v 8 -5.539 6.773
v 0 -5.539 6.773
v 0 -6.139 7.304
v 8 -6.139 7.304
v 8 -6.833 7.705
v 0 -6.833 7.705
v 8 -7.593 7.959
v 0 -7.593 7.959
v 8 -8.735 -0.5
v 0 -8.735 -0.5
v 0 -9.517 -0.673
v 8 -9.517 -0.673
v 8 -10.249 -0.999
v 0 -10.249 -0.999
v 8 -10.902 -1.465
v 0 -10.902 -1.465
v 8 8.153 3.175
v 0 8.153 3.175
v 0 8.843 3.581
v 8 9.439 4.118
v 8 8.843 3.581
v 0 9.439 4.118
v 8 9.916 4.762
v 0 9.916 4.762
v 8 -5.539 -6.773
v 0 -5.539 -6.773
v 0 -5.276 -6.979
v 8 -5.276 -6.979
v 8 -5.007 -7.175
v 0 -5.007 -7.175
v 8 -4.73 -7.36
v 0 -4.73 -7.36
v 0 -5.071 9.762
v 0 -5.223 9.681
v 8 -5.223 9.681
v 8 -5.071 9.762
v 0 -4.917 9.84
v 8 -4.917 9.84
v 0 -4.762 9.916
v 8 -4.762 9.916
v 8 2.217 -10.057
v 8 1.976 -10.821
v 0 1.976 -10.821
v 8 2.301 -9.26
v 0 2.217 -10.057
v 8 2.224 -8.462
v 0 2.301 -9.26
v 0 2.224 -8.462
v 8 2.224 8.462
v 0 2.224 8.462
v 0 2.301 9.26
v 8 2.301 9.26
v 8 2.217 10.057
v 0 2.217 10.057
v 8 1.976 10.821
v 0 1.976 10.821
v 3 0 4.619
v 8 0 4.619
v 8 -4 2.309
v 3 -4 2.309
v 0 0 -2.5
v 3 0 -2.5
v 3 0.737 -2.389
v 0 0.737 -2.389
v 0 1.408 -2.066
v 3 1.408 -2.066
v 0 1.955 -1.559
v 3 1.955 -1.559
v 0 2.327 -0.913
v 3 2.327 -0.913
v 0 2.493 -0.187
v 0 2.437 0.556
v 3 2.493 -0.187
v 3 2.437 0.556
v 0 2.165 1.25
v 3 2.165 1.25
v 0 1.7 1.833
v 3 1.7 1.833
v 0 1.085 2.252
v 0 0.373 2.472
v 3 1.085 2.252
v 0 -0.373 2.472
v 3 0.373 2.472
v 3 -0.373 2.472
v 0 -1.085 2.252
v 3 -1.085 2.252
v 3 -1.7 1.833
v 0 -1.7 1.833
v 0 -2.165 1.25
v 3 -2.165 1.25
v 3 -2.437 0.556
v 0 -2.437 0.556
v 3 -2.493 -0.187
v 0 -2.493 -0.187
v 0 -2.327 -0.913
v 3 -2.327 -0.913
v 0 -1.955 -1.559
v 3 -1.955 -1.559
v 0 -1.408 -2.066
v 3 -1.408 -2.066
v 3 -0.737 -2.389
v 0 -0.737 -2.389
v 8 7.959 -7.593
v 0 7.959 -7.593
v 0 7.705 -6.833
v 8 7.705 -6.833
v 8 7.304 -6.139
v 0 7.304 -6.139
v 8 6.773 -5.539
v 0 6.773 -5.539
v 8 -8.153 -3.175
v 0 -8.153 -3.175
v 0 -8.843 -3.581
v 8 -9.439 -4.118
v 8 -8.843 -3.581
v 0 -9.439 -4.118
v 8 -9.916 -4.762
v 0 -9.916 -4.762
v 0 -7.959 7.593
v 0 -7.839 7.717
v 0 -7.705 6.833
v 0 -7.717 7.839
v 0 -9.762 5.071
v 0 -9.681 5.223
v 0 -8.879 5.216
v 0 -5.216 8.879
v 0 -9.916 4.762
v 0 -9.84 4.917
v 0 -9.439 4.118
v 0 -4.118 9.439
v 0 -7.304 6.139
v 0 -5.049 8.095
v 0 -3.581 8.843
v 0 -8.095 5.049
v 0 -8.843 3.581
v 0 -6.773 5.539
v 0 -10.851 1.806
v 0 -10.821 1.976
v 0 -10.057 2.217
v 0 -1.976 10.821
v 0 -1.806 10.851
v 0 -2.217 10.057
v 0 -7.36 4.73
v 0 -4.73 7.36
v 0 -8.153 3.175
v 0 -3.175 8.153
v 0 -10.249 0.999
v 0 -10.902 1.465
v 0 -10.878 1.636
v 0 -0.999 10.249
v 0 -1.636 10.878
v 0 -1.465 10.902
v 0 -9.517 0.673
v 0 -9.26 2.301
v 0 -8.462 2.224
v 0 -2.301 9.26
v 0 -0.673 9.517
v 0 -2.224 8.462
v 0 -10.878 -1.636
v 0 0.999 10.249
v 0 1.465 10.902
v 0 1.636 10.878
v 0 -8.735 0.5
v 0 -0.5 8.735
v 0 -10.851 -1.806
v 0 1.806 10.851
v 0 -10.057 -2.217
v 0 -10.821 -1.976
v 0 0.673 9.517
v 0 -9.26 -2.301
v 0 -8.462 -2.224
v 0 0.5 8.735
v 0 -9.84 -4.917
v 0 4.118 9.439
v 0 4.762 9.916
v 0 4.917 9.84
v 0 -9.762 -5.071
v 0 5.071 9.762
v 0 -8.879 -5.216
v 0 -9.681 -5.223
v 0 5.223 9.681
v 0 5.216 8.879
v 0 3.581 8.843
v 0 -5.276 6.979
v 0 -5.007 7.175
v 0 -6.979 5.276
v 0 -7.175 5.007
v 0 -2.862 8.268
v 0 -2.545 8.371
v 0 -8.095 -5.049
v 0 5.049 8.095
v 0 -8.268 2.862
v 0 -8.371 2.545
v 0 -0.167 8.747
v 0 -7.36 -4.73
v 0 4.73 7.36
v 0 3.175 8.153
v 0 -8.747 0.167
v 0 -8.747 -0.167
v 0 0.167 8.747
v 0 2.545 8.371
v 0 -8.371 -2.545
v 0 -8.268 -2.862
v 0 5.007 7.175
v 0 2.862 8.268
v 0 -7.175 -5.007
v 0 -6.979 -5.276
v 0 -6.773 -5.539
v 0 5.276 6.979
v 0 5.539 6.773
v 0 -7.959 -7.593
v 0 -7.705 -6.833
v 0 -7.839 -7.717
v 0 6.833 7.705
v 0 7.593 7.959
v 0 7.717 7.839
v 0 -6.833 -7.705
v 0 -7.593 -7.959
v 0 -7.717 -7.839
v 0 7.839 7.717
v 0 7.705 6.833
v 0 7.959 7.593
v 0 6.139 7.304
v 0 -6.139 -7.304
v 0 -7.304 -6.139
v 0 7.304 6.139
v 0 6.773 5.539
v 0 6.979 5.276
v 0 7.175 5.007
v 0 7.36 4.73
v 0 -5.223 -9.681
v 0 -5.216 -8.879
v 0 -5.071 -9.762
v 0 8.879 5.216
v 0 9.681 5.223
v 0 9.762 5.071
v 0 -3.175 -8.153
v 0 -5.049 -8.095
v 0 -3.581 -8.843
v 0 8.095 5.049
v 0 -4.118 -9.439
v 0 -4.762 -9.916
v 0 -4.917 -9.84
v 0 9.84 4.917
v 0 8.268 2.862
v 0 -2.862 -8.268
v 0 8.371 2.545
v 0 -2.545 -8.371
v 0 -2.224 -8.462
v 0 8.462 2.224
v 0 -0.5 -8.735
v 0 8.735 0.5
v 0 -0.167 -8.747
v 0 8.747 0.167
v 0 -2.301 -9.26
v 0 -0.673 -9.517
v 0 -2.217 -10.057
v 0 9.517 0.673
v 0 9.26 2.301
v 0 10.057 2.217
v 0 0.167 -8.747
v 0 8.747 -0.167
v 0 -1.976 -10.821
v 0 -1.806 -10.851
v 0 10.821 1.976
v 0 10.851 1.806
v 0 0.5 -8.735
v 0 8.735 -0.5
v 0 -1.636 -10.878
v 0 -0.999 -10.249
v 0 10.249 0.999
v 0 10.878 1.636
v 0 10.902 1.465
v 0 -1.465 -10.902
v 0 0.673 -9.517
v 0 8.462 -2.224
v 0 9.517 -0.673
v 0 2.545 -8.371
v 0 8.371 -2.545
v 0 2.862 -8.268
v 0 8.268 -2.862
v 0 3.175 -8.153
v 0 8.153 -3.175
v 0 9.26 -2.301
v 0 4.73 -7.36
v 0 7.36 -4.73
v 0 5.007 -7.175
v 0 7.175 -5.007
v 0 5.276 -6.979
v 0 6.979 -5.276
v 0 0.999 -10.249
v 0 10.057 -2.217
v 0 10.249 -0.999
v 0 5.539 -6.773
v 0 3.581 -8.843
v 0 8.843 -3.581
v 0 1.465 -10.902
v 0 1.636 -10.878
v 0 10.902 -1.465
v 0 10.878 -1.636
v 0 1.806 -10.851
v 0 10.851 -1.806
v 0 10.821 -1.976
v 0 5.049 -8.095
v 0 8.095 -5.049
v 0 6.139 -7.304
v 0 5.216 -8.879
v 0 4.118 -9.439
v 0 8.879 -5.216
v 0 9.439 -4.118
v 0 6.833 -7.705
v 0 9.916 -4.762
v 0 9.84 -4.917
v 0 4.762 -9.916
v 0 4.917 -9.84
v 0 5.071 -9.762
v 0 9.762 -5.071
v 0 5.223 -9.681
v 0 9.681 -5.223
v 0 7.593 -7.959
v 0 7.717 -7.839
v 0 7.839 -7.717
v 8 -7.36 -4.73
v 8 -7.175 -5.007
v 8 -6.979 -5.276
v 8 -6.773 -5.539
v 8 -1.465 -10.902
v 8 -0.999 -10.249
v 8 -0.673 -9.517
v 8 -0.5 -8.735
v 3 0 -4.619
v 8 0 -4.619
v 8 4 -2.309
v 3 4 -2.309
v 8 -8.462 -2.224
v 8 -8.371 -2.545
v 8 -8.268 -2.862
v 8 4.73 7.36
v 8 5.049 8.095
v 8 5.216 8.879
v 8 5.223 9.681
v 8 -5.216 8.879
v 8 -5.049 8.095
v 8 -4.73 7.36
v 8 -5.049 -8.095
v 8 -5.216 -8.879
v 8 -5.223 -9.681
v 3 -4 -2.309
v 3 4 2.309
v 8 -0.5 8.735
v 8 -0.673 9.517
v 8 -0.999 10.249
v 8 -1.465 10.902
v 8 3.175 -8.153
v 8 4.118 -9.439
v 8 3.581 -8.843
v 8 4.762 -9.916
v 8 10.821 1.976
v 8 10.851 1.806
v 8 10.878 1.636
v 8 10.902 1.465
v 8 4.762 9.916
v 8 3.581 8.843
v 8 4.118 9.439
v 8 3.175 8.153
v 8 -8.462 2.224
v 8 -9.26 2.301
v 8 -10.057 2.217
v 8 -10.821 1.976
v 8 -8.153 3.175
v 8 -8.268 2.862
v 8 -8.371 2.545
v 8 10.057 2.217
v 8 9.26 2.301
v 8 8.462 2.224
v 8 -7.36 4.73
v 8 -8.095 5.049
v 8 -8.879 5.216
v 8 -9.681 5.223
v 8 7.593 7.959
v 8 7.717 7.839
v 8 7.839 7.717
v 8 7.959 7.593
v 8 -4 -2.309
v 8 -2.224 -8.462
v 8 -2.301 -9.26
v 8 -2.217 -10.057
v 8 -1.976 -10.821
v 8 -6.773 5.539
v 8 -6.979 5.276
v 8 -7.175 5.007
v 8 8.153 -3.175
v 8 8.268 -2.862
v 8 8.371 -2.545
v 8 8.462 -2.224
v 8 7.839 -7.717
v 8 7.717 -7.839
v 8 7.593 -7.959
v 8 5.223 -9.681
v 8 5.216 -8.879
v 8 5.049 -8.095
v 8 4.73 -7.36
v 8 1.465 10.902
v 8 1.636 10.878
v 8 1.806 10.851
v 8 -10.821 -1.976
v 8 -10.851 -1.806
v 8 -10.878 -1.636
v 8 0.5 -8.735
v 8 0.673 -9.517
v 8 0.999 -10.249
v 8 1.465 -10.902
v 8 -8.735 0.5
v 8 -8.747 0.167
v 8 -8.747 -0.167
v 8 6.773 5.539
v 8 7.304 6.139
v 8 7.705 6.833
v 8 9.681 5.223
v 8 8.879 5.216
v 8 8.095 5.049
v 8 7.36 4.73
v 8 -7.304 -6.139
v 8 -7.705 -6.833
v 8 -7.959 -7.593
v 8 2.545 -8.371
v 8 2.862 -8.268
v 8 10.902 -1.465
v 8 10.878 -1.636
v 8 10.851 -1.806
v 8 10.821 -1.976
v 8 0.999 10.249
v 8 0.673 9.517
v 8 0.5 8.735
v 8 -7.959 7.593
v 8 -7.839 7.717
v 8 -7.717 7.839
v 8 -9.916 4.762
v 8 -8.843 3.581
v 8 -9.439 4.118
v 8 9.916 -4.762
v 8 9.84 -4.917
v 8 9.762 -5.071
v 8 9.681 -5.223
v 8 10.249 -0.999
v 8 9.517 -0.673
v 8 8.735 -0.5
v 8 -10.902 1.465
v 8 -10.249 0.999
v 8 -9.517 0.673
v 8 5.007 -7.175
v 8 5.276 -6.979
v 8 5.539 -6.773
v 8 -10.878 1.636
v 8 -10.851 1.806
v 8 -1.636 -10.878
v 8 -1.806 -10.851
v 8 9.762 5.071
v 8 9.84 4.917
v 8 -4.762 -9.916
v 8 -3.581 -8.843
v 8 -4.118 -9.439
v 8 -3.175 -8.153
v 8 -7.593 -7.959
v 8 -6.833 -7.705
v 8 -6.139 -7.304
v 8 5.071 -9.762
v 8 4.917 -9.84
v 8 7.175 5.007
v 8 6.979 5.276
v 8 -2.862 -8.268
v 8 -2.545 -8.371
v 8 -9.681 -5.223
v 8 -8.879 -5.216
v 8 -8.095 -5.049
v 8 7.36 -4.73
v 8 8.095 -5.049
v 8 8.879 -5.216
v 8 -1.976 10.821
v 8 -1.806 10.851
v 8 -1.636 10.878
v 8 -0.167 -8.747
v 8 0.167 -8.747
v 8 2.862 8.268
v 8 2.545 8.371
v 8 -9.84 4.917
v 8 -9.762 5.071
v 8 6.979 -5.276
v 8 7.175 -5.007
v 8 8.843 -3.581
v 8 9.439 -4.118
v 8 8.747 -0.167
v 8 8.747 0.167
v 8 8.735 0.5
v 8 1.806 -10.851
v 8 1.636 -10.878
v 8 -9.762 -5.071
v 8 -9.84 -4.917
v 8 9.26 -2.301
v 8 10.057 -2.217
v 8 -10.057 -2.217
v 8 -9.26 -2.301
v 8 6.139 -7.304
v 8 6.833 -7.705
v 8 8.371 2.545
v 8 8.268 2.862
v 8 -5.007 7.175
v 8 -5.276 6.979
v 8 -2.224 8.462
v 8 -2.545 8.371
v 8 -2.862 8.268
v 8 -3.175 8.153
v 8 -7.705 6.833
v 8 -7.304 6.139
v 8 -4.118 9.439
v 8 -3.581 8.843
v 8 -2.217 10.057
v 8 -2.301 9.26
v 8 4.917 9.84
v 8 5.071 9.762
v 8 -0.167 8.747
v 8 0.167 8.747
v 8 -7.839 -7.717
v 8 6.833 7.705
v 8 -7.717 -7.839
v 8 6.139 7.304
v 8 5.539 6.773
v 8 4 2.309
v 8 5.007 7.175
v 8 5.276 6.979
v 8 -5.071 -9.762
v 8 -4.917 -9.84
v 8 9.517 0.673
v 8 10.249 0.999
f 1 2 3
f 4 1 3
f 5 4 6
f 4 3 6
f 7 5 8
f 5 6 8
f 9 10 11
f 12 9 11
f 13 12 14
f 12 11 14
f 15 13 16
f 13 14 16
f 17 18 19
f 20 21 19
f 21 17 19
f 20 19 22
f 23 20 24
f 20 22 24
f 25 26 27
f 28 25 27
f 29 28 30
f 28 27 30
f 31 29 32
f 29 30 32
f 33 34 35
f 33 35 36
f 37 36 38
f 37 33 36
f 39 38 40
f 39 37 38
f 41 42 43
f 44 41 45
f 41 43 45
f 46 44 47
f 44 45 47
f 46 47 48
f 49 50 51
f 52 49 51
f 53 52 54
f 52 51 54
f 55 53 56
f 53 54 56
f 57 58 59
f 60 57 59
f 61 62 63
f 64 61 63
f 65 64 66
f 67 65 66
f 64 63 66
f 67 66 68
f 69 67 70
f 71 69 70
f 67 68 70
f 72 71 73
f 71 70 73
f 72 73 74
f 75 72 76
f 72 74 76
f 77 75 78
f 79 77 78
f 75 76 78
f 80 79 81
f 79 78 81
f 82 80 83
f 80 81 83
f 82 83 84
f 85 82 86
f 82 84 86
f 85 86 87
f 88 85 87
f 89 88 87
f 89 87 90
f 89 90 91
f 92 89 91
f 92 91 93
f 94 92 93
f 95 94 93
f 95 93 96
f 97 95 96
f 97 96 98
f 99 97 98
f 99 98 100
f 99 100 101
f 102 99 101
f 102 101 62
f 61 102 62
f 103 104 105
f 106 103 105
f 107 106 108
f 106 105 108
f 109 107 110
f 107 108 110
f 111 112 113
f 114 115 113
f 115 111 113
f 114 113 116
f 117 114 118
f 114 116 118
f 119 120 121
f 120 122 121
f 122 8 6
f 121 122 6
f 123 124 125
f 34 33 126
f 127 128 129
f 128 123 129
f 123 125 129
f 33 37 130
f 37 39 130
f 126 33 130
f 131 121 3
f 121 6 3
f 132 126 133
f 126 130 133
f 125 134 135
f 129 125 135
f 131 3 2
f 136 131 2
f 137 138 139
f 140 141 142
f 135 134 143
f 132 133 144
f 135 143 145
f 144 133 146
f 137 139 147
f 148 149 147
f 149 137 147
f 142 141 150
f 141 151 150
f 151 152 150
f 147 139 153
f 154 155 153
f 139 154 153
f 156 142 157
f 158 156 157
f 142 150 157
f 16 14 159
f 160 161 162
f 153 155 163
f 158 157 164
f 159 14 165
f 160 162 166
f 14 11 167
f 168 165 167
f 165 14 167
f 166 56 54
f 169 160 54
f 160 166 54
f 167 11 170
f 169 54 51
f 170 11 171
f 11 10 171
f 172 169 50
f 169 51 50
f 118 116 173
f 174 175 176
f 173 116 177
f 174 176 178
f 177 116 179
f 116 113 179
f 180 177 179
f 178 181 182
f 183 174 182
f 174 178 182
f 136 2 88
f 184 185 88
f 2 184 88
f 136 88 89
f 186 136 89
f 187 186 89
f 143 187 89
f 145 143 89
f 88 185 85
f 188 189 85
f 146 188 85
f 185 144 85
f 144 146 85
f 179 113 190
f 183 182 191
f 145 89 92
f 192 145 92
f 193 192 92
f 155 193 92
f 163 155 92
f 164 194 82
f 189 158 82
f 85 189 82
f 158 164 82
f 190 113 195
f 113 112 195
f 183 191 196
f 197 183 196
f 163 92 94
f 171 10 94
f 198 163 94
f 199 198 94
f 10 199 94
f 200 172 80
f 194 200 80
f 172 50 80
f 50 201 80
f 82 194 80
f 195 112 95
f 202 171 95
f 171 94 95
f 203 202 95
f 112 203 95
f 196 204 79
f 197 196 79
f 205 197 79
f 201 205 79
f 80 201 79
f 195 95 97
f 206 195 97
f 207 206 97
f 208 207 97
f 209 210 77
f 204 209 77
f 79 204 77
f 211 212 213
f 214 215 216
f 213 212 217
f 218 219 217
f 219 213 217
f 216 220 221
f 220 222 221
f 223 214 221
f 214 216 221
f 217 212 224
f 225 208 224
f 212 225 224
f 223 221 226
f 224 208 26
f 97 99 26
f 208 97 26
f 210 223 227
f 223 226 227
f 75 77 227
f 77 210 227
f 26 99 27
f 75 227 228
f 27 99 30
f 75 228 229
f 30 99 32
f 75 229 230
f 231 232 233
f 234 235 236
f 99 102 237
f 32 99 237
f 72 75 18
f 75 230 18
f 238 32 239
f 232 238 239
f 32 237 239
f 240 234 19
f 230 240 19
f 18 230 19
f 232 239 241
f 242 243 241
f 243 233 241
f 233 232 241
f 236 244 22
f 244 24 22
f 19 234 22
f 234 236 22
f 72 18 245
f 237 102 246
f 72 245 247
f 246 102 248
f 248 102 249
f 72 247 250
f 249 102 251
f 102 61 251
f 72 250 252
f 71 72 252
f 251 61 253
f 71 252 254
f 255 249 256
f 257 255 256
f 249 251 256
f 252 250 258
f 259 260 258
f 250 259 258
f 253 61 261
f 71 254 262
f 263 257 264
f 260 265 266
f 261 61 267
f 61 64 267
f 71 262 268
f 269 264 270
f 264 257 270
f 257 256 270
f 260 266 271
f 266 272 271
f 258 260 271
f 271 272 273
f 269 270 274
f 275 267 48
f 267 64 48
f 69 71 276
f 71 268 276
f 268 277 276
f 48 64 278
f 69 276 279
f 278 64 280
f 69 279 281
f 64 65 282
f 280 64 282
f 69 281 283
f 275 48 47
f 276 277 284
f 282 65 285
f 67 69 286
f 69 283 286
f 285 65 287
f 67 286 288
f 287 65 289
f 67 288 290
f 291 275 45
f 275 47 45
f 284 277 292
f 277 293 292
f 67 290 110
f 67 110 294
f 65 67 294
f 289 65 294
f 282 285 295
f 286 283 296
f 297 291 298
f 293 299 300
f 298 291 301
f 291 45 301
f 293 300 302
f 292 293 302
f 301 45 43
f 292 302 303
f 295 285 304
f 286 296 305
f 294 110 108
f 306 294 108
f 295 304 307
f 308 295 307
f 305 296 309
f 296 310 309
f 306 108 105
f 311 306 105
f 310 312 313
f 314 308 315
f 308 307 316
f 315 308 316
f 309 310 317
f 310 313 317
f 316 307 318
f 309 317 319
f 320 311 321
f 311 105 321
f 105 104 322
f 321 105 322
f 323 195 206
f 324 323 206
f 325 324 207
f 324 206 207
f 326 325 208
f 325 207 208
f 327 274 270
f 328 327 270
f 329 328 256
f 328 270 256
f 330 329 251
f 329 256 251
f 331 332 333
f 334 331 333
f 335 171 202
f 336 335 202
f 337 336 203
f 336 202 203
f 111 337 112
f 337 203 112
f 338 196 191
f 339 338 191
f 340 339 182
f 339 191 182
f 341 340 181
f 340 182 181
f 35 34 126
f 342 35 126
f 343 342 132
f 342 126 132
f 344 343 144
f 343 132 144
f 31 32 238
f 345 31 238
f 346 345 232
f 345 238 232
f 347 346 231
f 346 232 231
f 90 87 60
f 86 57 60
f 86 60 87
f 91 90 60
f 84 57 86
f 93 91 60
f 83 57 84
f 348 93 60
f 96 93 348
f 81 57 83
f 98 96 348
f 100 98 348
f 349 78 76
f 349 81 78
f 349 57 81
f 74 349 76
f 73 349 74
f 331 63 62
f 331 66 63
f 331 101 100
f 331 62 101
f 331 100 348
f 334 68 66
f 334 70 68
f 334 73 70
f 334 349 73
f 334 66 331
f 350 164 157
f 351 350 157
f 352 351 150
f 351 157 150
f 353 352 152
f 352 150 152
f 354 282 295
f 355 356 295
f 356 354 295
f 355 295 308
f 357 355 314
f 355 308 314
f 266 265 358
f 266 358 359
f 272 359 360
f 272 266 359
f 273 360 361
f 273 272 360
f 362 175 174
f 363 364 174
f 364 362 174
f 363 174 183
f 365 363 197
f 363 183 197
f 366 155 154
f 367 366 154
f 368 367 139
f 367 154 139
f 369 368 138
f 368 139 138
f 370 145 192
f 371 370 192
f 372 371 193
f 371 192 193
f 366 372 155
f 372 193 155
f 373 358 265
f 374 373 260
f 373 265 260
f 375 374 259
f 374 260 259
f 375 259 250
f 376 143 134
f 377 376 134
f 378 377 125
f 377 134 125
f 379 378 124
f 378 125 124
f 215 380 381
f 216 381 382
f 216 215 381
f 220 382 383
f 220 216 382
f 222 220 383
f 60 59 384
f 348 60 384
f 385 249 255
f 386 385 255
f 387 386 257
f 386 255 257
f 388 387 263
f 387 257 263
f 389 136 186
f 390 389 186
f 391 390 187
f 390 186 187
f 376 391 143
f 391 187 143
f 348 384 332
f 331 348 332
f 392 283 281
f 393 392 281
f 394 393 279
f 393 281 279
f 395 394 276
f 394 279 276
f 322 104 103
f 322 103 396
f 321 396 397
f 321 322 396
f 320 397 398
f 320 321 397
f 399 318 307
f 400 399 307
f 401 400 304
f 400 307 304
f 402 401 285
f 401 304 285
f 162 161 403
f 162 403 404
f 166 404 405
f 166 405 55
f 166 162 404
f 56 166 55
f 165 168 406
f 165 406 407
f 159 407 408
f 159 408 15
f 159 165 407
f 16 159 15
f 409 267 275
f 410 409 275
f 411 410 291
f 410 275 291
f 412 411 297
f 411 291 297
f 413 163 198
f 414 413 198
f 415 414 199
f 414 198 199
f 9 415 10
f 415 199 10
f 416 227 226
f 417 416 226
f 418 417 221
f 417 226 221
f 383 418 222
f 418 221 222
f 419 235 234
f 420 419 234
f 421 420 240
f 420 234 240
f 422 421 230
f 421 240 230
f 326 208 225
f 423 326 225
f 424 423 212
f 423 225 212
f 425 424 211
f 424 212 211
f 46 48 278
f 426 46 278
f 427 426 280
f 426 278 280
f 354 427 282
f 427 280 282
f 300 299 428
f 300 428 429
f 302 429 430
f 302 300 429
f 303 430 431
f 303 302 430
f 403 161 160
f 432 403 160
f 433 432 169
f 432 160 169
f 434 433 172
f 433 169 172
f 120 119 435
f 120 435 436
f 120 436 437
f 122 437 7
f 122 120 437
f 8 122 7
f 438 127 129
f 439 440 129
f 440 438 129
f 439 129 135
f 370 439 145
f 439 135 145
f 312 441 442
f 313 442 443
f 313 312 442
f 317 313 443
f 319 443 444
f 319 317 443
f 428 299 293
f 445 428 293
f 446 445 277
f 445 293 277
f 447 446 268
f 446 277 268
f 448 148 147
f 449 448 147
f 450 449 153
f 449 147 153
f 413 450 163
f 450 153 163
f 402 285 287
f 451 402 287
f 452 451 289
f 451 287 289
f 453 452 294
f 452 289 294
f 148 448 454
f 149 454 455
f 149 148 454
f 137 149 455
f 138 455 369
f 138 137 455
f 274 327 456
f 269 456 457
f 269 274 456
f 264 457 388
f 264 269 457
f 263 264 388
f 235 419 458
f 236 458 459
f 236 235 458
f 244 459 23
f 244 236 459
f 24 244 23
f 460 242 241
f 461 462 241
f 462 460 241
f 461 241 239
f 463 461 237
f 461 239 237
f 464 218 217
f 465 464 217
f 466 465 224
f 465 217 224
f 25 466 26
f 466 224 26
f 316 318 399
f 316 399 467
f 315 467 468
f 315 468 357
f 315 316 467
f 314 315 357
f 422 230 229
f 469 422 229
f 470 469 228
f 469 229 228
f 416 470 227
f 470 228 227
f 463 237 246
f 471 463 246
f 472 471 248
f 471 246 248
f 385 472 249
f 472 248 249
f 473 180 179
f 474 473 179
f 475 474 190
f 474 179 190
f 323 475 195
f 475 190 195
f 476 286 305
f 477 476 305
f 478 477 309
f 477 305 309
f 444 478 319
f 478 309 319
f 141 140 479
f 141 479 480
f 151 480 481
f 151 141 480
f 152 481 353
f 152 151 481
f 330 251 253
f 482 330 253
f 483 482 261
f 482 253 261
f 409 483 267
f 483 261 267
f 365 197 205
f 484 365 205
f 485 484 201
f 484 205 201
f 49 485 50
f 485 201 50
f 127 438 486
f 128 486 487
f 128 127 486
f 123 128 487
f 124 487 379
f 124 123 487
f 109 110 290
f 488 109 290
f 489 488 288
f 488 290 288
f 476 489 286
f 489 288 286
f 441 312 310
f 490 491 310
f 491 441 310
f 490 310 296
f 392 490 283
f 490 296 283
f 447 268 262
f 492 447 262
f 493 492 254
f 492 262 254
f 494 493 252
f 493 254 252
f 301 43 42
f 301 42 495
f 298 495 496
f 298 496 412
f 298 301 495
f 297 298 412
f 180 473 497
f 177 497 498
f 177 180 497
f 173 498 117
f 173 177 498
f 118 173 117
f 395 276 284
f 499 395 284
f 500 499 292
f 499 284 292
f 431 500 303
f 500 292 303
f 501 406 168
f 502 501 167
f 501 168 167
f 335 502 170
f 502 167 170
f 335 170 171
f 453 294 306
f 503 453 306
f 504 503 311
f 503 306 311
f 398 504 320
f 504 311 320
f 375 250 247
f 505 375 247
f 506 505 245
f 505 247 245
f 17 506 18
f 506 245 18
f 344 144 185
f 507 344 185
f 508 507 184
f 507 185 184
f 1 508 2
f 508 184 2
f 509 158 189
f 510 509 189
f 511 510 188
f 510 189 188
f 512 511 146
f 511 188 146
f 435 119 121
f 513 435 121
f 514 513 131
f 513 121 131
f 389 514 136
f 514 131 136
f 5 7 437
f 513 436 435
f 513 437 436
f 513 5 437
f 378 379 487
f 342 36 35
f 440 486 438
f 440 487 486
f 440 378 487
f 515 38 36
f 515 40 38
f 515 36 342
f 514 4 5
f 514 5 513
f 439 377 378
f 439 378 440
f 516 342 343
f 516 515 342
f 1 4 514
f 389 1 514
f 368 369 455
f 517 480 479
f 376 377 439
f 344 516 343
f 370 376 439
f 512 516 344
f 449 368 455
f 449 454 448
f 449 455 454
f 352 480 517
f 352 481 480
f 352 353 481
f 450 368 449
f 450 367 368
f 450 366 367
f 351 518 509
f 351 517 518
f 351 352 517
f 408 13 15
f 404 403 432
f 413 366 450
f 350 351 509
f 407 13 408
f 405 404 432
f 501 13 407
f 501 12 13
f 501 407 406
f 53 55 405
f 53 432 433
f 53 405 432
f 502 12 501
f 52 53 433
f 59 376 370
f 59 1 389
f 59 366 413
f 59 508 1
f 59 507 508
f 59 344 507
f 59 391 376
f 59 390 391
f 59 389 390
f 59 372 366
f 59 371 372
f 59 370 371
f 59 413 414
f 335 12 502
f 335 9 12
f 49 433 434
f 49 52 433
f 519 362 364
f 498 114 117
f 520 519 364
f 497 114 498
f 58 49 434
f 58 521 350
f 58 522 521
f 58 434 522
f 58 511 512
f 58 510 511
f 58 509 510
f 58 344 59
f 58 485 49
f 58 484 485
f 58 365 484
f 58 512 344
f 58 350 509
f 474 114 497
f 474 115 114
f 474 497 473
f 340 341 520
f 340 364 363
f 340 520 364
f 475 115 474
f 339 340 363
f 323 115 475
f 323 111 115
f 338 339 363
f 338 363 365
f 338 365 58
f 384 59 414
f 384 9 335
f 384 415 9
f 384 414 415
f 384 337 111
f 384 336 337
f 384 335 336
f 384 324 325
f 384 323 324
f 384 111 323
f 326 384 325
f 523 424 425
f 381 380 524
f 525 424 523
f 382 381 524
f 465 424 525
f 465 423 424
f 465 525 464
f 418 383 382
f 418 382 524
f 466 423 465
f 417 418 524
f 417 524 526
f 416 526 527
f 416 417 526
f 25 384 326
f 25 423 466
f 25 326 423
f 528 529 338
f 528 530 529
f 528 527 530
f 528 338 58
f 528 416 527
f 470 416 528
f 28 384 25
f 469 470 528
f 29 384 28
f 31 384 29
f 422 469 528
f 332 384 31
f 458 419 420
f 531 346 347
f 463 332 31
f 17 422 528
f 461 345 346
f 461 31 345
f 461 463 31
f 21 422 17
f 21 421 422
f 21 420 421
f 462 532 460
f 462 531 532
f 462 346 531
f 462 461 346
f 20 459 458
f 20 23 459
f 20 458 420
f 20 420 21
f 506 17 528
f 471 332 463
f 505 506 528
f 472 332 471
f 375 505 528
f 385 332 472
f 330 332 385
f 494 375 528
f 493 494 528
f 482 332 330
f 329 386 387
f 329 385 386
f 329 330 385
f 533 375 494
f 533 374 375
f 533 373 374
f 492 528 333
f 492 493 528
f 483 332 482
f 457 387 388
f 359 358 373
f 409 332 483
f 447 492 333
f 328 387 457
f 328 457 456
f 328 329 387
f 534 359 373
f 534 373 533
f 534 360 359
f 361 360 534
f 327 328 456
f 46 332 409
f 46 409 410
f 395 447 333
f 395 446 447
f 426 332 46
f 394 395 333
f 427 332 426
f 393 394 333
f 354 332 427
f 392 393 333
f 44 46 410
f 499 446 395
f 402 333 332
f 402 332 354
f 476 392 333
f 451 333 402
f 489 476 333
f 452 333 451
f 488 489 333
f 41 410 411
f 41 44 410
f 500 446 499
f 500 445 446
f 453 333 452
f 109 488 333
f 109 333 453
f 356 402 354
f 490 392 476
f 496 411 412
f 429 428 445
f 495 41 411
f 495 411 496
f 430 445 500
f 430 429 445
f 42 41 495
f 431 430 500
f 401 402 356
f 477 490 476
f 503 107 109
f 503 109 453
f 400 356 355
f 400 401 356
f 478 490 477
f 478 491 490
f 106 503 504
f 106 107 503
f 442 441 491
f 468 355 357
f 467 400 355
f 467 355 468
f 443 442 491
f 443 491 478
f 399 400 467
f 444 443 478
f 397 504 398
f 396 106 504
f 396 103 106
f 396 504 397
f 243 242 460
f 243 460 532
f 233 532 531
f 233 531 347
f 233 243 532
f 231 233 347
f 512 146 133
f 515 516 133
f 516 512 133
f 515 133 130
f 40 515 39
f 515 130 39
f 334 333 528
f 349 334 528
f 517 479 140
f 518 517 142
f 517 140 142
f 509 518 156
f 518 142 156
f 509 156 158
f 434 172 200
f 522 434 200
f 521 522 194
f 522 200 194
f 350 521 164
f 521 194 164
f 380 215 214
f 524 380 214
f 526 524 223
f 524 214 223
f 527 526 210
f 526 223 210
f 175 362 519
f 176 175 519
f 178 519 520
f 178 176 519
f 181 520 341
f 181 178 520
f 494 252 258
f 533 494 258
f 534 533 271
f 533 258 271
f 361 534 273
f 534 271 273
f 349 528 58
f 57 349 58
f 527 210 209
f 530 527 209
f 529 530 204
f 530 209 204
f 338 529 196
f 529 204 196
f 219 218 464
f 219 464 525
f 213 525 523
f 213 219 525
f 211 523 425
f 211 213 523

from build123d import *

# Parameters (mm, degrees)
SKETCH_1_W                = 8
SKETCH_1_H                = 11
CUT_EXTRUDE_1_DEPTH       = 18.492855685
CUT_EXTRUDE_2_DEPTH       = 18.492855685
CUT_EXTRUDE_3_DEPTH       = 18.492855685
CUT_EXTRUDE_4_DEPTH       = 18.492855685
CUT_EXTRUDE_5_DEPTH       = 18.492855685
CUT_EXTRUDE_6_DEPTH       = 18.492855685
CUT_EXTRUDE_7_DEPTH       = 18.492855685
CUT_EXTRUDE_8_DEPTH       = 18.492855685
CUT_EXTRUDE_9_DEPTH       = 18.492855685
CUT_EXTRUDE_10_DEPTH      = 18.492855685
CUT_EXTRUDE_11_DEPTH      = 18.492855685
CUT_EXTRUDE_12_DEPTH      = 18.431405642
CUT_EXTRUDE_13_DEPTH      = 18.431405642
CUT_EXTRUDE_14_DEPTH      = 18.431405642
CUT_EXTRUDE_15_DEPTH      = 18.431405642
CUT_EXTRUDE_16_DEPTH      = 18.431405642
CUT_EXTRUDE_17_DEPTH      = 18.369738204
CUT_EXTRUDE_18_DEPTH      = 18.369738204
CUT_EXTRUDE_19_DEPTH      = 18.369738204
CUT_EXTRUDE_20_DEPTH      = 18.369738204
CUT_EXTRUDE_21_DEPTH      = 5
HOLE_WIZARD_5_0_5_1_D     = 5
HOLE_WIZARD_5_0_5_1_DEPTH = 8


with BuildPart() as part:
    # 草圖1 → 旋轉1 (revolve)
    with BuildSketch(Plane(origin=(0, 0, 0), x_dir=(-1, 0, 0), z_dir=(0, 0, -1)), mode=Mode.PRIVATE) as revolve_1_sk:
        with Locations((-4, 5.5)):
            Rectangle(SKETCH_1_W, SKETCH_1_H)
    revolve(revolve_1_sk.sketch.rotate(Axis((8, 0, 0), (-1, 0, 0)), 270), axis=Axis((8, 0, 0), (-1, 0, 0)))

    # 草圖2 → 除料-伸長1 (cut, through all)
    with BuildSketch(Plane.ZY):
        with BuildLine():
            ThreePointArc((10.902013697, -1.464956435), (11, 0), (10.902013697, 1.464956435))
            ThreePointArc((10.902013697, 1.464956435), (9.891552344, 0.818060825), (8.734705318, 0.499924007))
            ThreePointArc((8.734705318, 0.499924007), (8.749, 0), (8.734705318, -0.499924007))
            ThreePointArc((8.734705318, -0.499924007), (9.891552344, -0.818060825), (10.902013697, -1.464956435))
        make_face()
    extrude(amount=-CUT_EXTRUDE_1_DEPTH, mode=Mode.SUBTRACT)

    # 草圖3 → 除料-伸長2 (cut, through all)
    with BuildSketch(Plane.ZY):
        with BuildLine():
            ThreePointArc((9.915734733, -4.762163869), (10.461621679, -3.399186938), (10.821127601, -1.975651141))
            ThreePointArc((10.821127601, -1.975651141), (9.66022001, -2.278635697), (8.461683425, -2.223716399))
            ThreePointArc((8.461683425, -2.223716399), (8.320793461, -2.703589684), (8.152713396, -3.174628369))
            ThreePointArc((8.152713396, -3.174628369), (9.154630615, -3.834679853), (9.915734733, -4.762163869))
        make_face()
    extrude(amount=-CUT_EXTRUDE_2_DEPTH, mode=Mode.SUBTRACT)

    # 草圖4 → 除料-伸長3 (cut, through all)
    with BuildSketch(Plane.ZY):
        with BuildLine():
            ThreePointArc((7.958834566, -7.593217523), (8.899186938, -6.465637775), (9.680994141, -5.222868219))
            ThreePointArc((9.680994141, -5.222868219), (8.483278035, -5.15228348), (7.360373002, -4.729683951))
            ThreePointArc((7.360373002, -4.729683951), (7.078089684, -5.142533172), (6.772677084, -5.538577987))
            ThreePointArc((6.772677084, -5.538577987), (7.521589858, -6.4759337), (7.958834566, -7.593217523))
        make_face()
    extrude(amount=-CUT_EXTRUDE_3_DEPTH, mode=Mode.SUBTRACT)

    # 草圖5 → 除料-伸長4 (cut, through all)
    with BuildSketch(Plane.ZY):
        with BuildLine():
            ThreePointArc((5.222868219, -9.680994141), (6.465637775, -8.899186938), (7.593217523, -7.958834566))
            ThreePointArc((7.593217523, -7.958834566), (6.4759337, -7.521589858), (5.538577987, -6.772677084))
            ThreePointArc((5.538577987, -6.772677084), (5.142533172, -7.078089684), (4.729683951, -7.360373002))
            ThreePointArc((4.729683951, -7.360373002), (5.15228348, -8.483278035), (5.222868219, -9.680994141))
        make_face()
    extrude(amount=-CUT_EXTRUDE_4_DEPTH, mode=Mode.SUBTRACT)

    # 草圖6 → 除料-伸長5 (cut, through all)
    with BuildSketch(Plane.ZY):
        with BuildLine():
            ThreePointArc((1.975651141, -10.821127601), (3.399186938, -10.461621679), (4.762163869, -9.915734733))
            ThreePointArc((4.762163869, -9.915734733), (3.834679853, -9.154630615), (3.174628369, -8.152713396))
            ThreePointArc((3.174628369, -8.152713396), (2.703589684, -8.320793461), (2.223716399, -8.461683425))
            ThreePointArc((2.223716399, -8.461683425), (2.278635697, -9.66022001), (1.975651141, -10.821127601))
        make_face()
    extrude(amount=-CUT_EXTRUDE_5_DEPTH, mode=Mode.SUBTRACT)

    # 草圖7 → 除料-伸長6 (cut, through all)
    with BuildSketch(Plane.ZY):
        with BuildLine():
            ThreePointArc((-1.464956435, -10.902013697), (0, -11), (1.464956435, -10.902013697))
            ThreePointArc((1.464956435, -10.902013697), (0.818060825, -9.891552344), (0.499924007, -8.734705318))
            ThreePointArc((0.499924007, -8.734705318), (0, -8.749), (-0.499924007, -8.734705318))
            ThreePointArc((-0.499924007, -8.734705318), (-0.818060825, -9.891552344), (-1.464956435, -10.902013697))
        make_face()
    extrude(amount=-CUT_EXTRUDE_6_DEPTH, mode=Mode.SUBTRACT)

    # 草圖8 → 除料-伸長7 (cut, through all)
    with BuildSketch(Plane.ZY):
        with BuildLine():
            ThreePointArc((-4.762163869, -9.915734733), (-3.399186938, -10.461621679), (-1.975651141, -10.821127601))
            ThreePointArc((-1.975651141, -10.821127601), (-2.278635697, -9.66022001), (-2.223716399, -8.461683425))
            ThreePointArc((-2.223716399, -8.461683425), (-2.703589684, -8.320793461), (-3.174628369, -8.152713396))
            ThreePointArc((-3.174628369, -8.152713396), (-3.834679853, -9.154630615), (-4.762163869, -9.915734733))
        make_face()
    extrude(amount=-CUT_EXTRUDE_7_DEPTH, mode=Mode.SUBTRACT)

    # 草圖9 → 除料-伸長8 (cut, through all)
    with BuildSketch(Plane.ZY):
        with BuildLine():
            ThreePointArc((-7.593217523, -7.958834566), (-6.465637775, -8.899186938), (-5.222868219, -9.680994141))
            ThreePointArc((-5.222868219, -9.680994141), (-5.15228348, -8.483278035), (-4.729683951, -7.360373002))
            ThreePointArc((-4.729683951, -7.360373002), (-5.142533172, -7.078089684), (-5.538577987, -6.772677084))
            ThreePointArc((-5.538577987, -6.772677084), (-6.4759337, -7.521589858), (-7.593217523, -7.958834566))
        make_face()
    extrude(amount=-CUT_EXTRUDE_8_DEPTH, mode=Mode.SUBTRACT)

    # 草圖10 → 除料-伸長9 (cut, through all)
    with BuildSketch(Plane.ZY):
        with BuildLine():
            ThreePointArc((-9.680994141, -5.222868219), (-8.899186938, -6.465637775), (-7.958834566, -7.593217523))
            ThreePointArc((-7.958834566, -7.593217523), (-7.521589858, -6.4759337), (-6.772677084, -5.538577987))
            ThreePointArc((-6.772677084, -5.538577987), (-7.078089684, -5.142533172), (-7.360373002, -4.729683951))
            ThreePointArc((-7.360373002, -4.729683951), (-8.483278035, -5.15228348), (-9.680994141, -5.222868219))
        make_face()
    extrude(amount=-CUT_EXTRUDE_9_DEPTH, mode=Mode.SUBTRACT)

    # 草圖11 → 除料-伸長10 (cut, through all)
    with BuildSketch(Plane.ZY):
        with BuildLine():
            ThreePointArc((-10.821127601, -1.975651141), (-10.461621679, -3.399186938), (-9.915734733, -4.762163869))
            ThreePointArc((-9.915734733, -4.762163869), (-9.154630615, -3.834679853), (-8.152713396, -3.174628369))
            ThreePointArc((-8.152713396, -3.174628369), (-8.320793461, -2.703589684), (-8.461683425, -2.223716399))
            ThreePointArc((-8.461683425, -2.223716399), (-9.66022001, -2.278635697), (-10.821127601, -1.975651141))
        make_face()
    extrude(amount=-CUT_EXTRUDE_10_DEPTH, mode=Mode.SUBTRACT)

    # 草圖12 → 除料-伸長11 (cut, through all)
    with BuildSketch(Plane.ZY):
        with BuildLine():
            ThreePointArc((-10.902013697, 1.464956435), (-11, 0), (-10.902013697, -1.464956435))
            ThreePointArc((-10.902013697, -1.464956435), (-9.891552344, -0.818060825), (-8.734705318, -0.499924007))
            ThreePointArc((-8.734705318, -0.499924007), (-8.749, 0), (-8.734705318, 0.499924007))
            ThreePointArc((-8.734705318, 0.499924007), (-9.891552344, 0.818060825), (-10.902013697, 1.464956435))
        make_face()
    extrude(amount=-CUT_EXTRUDE_11_DEPTH, mode=Mode.SUBTRACT)

    # 草圖13 → 除料-伸長12 (cut, through all)
    with BuildSketch(Plane.ZY):
        with BuildLine():
            ThreePointArc((-9.915734733, 4.762163869), (-10.461621679, 3.399186938), (-10.821127601, 1.975651141))
            ThreePointArc((-10.821127601, 1.975651141), (-9.66022001, 2.278635697), (-8.461683425, 2.223716399))
            ThreePointArc((-8.461683425, 2.223716399), (-8.320793461, 2.703589684), (-8.152713396, 3.174628369))
            ThreePointArc((-8.152713396, 3.174628369), (-9.154630615, 3.834679853), (-9.915734733, 4.762163869))
        make_face()
    extrude(amount=-CUT_EXTRUDE_12_DEPTH, mode=Mode.SUBTRACT)

    # 草圖14 → 除料-伸長13 (cut, through all)
    with BuildSketch(Plane.ZY):
        with BuildLine():
            ThreePointArc((-7.958834566, 7.593217523), (-8.899186938, 6.465637775), (-9.680994141, 5.222868219))
            ThreePointArc((-9.680994141, 5.222868219), (-8.483278035, 5.15228348), (-7.360373002, 4.729683951))
            ThreePointArc((-7.360373002, 4.729683951), (-7.078089684, 5.142533172), (-6.772677084, 5.538577987))
            ThreePointArc((-6.772677084, 5.538577987), (-7.521589858, 6.4759337), (-7.958834566, 7.593217523))
        make_face()
    extrude(amount=-CUT_EXTRUDE_13_DEPTH, mode=Mode.SUBTRACT)

    # 草圖15 → 除料-伸長14 (cut, through all)
    with BuildSketch(Plane.ZY):
        with BuildLine():
            ThreePointArc((-5.222868219, 9.680994141), (-6.465637775, 8.899186938), (-7.593217523, 7.958834566))
            ThreePointArc((-7.593217523, 7.958834566), (-6.4759337, 7.521589858), (-5.538577987, 6.772677084))
            ThreePointArc((-5.538577987, 6.772677084), (-5.142533172, 7.078089684), (-4.729683951, 7.360373002))
            ThreePointArc((-4.729683951, 7.360373002), (-5.15228348, 8.483278035), (-5.222868219, 9.680994141))
        make_face()
    extrude(amount=-CUT_EXTRUDE_14_DEPTH, mode=Mode.SUBTRACT)

    # 草圖16 → 除料-伸長15 (cut, through all)
    with BuildSketch(Plane.ZY):
        with BuildLine():
            ThreePointArc((-1.975651141, 10.821127601), (-3.399186938, 10.461621679), (-4.762163869, 9.915734733))
            ThreePointArc((-4.762163869, 9.915734733), (-3.834679853, 9.154630615), (-3.174628369, 8.152713396))
            ThreePointArc((-3.174628369, 8.152713396), (-2.703589684, 8.320793461), (-2.223716399, 8.461683425))
            ThreePointArc((-2.223716399, 8.461683425), (-2.278635697, 9.66022001), (-1.975651141, 10.821127601))
        make_face()
    extrude(amount=-CUT_EXTRUDE_15_DEPTH, mode=Mode.SUBTRACT)

    # 草圖17 → 除料-伸長16 (cut, through all)
    with BuildSketch(Plane.ZY):
        with BuildLine():
            ThreePointArc((1.464956435, 10.902013697), (0, 11), (-1.464956435, 10.902013697))
            ThreePointArc((-1.464956435, 10.902013697), (-0.818060825, 9.891552344), (-0.499924007, 8.734705318))
            ThreePointArc((-0.499924007, 8.734705318), (0, 8.749), (0.499924007, 8.734705318))
            ThreePointArc((0.499924007, 8.734705318), (0.818060825, 9.891552344), (1.464956435, 10.902013697))
        make_face()
    extrude(amount=-CUT_EXTRUDE_16_DEPTH, mode=Mode.SUBTRACT)

    # 草圖18 → 除料-伸長17 (cut, through all)
    with BuildSketch(Plane.ZY):
        with BuildLine():
            ThreePointArc((4.762163869, 9.915734733), (3.399186938, 10.461621679), (1.975651141, 10.821127601))
            ThreePointArc((1.975651141, 10.821127601), (2.278635697, 9.66022001), (2.223716399, 8.461683425))
            ThreePointArc((2.223716399, 8.461683425), (2.703589684, 8.320793461), (3.174628369, 8.152713396))
            ThreePointArc((3.174628369, 8.152713396), (3.834679853, 9.154630615), (4.762163869, 9.915734733))
        make_face()
    extrude(amount=-CUT_EXTRUDE_17_DEPTH, mode=Mode.SUBTRACT)

    # 草圖19 → 除料-伸長18 (cut, through all)
    with BuildSketch(Plane.ZY):
        with BuildLine():
            ThreePointArc((7.593217523, 7.958834566), (6.465637775, 8.899186938), (5.222868219, 9.680994141))
            ThreePointArc((5.222868219, 9.680994141), (5.15228348, 8.483278035), (4.729683951, 7.360373002))
            ThreePointArc((4.729683951, 7.360373002), (5.142533172, 7.078089684), (5.538577987, 6.772677084))
            ThreePointArc((5.538577987, 6.772677084), (6.4759337, 7.521589858), (7.593217523, 7.958834566))
        make_face()
    extrude(amount=-CUT_EXTRUDE_18_DEPTH, mode=Mode.SUBTRACT)

    # 草圖20 → 除料-伸長19 (cut, through all)
    with BuildSketch(Plane.ZY):
        with BuildLine():
            ThreePointArc((9.680994141, 5.222868219), (8.899186938, 6.465637775), (7.958834566, 7.593217523))
            ThreePointArc((7.958834566, 7.593217523), (7.521589858, 6.4759337), (6.772677084, 5.538577987))
            ThreePointArc((6.772677084, 5.538577987), (7.078089684, 5.142533172), (7.360373002, 4.729683951))
            ThreePointArc((7.360373002, 4.729683951), (8.483278035, 5.15228348), (9.680994141, 5.222868219))
        make_face()
    extrude(amount=-CUT_EXTRUDE_19_DEPTH, mode=Mode.SUBTRACT)

    # 草圖21 → 除料-伸長20 (cut, through all)
    with BuildSketch(Plane.ZY):
        with BuildLine():
            ThreePointArc((10.821127601, 1.975651141), (10.461621679, 3.399186938), (9.915734733, 4.762163869))
            ThreePointArc((9.915734733, 4.762163869), (9.154630615, 3.834679853), (8.152713396, 3.174628369))
            ThreePointArc((8.152713396, 3.174628369), (8.320793461, 2.703589684), (8.461683425, 2.223716399))
            ThreePointArc((8.461683425, 2.223716399), (9.66022001, 2.278635697), (10.821127601, 1.975651141))
        make_face()
    extrude(amount=-CUT_EXTRUDE_20_DEPTH, mode=Mode.SUBTRACT)

    # 草圖22 → 除料-伸長21 (cut)
    with BuildSketch(Plane(origin=(8, 0, 0), x_dir=(0, 0, -1), z_dir=(1, 0, 0))):
        Polygon((-4.618802154, 0), (-2.309401077, -4), (2.309401077, -4), (4.618802154, 0), (2.309401077, 4), (-2.309401077, 4), align=None)
    extrude(amount=-CUT_EXTRUDE_21_DEPTH, mode=Mode.SUBTRACT)

    # Ø5.0 (5) 直徑孔1
    with Locations(Plane.ZY):
        with Locations((0, 0)):
            Hole(HOLE_WIZARD_5_0_5_1_D / 2, depth=HOLE_WIZARD_5_0_5_1_DEPTH)


solid = part.part
